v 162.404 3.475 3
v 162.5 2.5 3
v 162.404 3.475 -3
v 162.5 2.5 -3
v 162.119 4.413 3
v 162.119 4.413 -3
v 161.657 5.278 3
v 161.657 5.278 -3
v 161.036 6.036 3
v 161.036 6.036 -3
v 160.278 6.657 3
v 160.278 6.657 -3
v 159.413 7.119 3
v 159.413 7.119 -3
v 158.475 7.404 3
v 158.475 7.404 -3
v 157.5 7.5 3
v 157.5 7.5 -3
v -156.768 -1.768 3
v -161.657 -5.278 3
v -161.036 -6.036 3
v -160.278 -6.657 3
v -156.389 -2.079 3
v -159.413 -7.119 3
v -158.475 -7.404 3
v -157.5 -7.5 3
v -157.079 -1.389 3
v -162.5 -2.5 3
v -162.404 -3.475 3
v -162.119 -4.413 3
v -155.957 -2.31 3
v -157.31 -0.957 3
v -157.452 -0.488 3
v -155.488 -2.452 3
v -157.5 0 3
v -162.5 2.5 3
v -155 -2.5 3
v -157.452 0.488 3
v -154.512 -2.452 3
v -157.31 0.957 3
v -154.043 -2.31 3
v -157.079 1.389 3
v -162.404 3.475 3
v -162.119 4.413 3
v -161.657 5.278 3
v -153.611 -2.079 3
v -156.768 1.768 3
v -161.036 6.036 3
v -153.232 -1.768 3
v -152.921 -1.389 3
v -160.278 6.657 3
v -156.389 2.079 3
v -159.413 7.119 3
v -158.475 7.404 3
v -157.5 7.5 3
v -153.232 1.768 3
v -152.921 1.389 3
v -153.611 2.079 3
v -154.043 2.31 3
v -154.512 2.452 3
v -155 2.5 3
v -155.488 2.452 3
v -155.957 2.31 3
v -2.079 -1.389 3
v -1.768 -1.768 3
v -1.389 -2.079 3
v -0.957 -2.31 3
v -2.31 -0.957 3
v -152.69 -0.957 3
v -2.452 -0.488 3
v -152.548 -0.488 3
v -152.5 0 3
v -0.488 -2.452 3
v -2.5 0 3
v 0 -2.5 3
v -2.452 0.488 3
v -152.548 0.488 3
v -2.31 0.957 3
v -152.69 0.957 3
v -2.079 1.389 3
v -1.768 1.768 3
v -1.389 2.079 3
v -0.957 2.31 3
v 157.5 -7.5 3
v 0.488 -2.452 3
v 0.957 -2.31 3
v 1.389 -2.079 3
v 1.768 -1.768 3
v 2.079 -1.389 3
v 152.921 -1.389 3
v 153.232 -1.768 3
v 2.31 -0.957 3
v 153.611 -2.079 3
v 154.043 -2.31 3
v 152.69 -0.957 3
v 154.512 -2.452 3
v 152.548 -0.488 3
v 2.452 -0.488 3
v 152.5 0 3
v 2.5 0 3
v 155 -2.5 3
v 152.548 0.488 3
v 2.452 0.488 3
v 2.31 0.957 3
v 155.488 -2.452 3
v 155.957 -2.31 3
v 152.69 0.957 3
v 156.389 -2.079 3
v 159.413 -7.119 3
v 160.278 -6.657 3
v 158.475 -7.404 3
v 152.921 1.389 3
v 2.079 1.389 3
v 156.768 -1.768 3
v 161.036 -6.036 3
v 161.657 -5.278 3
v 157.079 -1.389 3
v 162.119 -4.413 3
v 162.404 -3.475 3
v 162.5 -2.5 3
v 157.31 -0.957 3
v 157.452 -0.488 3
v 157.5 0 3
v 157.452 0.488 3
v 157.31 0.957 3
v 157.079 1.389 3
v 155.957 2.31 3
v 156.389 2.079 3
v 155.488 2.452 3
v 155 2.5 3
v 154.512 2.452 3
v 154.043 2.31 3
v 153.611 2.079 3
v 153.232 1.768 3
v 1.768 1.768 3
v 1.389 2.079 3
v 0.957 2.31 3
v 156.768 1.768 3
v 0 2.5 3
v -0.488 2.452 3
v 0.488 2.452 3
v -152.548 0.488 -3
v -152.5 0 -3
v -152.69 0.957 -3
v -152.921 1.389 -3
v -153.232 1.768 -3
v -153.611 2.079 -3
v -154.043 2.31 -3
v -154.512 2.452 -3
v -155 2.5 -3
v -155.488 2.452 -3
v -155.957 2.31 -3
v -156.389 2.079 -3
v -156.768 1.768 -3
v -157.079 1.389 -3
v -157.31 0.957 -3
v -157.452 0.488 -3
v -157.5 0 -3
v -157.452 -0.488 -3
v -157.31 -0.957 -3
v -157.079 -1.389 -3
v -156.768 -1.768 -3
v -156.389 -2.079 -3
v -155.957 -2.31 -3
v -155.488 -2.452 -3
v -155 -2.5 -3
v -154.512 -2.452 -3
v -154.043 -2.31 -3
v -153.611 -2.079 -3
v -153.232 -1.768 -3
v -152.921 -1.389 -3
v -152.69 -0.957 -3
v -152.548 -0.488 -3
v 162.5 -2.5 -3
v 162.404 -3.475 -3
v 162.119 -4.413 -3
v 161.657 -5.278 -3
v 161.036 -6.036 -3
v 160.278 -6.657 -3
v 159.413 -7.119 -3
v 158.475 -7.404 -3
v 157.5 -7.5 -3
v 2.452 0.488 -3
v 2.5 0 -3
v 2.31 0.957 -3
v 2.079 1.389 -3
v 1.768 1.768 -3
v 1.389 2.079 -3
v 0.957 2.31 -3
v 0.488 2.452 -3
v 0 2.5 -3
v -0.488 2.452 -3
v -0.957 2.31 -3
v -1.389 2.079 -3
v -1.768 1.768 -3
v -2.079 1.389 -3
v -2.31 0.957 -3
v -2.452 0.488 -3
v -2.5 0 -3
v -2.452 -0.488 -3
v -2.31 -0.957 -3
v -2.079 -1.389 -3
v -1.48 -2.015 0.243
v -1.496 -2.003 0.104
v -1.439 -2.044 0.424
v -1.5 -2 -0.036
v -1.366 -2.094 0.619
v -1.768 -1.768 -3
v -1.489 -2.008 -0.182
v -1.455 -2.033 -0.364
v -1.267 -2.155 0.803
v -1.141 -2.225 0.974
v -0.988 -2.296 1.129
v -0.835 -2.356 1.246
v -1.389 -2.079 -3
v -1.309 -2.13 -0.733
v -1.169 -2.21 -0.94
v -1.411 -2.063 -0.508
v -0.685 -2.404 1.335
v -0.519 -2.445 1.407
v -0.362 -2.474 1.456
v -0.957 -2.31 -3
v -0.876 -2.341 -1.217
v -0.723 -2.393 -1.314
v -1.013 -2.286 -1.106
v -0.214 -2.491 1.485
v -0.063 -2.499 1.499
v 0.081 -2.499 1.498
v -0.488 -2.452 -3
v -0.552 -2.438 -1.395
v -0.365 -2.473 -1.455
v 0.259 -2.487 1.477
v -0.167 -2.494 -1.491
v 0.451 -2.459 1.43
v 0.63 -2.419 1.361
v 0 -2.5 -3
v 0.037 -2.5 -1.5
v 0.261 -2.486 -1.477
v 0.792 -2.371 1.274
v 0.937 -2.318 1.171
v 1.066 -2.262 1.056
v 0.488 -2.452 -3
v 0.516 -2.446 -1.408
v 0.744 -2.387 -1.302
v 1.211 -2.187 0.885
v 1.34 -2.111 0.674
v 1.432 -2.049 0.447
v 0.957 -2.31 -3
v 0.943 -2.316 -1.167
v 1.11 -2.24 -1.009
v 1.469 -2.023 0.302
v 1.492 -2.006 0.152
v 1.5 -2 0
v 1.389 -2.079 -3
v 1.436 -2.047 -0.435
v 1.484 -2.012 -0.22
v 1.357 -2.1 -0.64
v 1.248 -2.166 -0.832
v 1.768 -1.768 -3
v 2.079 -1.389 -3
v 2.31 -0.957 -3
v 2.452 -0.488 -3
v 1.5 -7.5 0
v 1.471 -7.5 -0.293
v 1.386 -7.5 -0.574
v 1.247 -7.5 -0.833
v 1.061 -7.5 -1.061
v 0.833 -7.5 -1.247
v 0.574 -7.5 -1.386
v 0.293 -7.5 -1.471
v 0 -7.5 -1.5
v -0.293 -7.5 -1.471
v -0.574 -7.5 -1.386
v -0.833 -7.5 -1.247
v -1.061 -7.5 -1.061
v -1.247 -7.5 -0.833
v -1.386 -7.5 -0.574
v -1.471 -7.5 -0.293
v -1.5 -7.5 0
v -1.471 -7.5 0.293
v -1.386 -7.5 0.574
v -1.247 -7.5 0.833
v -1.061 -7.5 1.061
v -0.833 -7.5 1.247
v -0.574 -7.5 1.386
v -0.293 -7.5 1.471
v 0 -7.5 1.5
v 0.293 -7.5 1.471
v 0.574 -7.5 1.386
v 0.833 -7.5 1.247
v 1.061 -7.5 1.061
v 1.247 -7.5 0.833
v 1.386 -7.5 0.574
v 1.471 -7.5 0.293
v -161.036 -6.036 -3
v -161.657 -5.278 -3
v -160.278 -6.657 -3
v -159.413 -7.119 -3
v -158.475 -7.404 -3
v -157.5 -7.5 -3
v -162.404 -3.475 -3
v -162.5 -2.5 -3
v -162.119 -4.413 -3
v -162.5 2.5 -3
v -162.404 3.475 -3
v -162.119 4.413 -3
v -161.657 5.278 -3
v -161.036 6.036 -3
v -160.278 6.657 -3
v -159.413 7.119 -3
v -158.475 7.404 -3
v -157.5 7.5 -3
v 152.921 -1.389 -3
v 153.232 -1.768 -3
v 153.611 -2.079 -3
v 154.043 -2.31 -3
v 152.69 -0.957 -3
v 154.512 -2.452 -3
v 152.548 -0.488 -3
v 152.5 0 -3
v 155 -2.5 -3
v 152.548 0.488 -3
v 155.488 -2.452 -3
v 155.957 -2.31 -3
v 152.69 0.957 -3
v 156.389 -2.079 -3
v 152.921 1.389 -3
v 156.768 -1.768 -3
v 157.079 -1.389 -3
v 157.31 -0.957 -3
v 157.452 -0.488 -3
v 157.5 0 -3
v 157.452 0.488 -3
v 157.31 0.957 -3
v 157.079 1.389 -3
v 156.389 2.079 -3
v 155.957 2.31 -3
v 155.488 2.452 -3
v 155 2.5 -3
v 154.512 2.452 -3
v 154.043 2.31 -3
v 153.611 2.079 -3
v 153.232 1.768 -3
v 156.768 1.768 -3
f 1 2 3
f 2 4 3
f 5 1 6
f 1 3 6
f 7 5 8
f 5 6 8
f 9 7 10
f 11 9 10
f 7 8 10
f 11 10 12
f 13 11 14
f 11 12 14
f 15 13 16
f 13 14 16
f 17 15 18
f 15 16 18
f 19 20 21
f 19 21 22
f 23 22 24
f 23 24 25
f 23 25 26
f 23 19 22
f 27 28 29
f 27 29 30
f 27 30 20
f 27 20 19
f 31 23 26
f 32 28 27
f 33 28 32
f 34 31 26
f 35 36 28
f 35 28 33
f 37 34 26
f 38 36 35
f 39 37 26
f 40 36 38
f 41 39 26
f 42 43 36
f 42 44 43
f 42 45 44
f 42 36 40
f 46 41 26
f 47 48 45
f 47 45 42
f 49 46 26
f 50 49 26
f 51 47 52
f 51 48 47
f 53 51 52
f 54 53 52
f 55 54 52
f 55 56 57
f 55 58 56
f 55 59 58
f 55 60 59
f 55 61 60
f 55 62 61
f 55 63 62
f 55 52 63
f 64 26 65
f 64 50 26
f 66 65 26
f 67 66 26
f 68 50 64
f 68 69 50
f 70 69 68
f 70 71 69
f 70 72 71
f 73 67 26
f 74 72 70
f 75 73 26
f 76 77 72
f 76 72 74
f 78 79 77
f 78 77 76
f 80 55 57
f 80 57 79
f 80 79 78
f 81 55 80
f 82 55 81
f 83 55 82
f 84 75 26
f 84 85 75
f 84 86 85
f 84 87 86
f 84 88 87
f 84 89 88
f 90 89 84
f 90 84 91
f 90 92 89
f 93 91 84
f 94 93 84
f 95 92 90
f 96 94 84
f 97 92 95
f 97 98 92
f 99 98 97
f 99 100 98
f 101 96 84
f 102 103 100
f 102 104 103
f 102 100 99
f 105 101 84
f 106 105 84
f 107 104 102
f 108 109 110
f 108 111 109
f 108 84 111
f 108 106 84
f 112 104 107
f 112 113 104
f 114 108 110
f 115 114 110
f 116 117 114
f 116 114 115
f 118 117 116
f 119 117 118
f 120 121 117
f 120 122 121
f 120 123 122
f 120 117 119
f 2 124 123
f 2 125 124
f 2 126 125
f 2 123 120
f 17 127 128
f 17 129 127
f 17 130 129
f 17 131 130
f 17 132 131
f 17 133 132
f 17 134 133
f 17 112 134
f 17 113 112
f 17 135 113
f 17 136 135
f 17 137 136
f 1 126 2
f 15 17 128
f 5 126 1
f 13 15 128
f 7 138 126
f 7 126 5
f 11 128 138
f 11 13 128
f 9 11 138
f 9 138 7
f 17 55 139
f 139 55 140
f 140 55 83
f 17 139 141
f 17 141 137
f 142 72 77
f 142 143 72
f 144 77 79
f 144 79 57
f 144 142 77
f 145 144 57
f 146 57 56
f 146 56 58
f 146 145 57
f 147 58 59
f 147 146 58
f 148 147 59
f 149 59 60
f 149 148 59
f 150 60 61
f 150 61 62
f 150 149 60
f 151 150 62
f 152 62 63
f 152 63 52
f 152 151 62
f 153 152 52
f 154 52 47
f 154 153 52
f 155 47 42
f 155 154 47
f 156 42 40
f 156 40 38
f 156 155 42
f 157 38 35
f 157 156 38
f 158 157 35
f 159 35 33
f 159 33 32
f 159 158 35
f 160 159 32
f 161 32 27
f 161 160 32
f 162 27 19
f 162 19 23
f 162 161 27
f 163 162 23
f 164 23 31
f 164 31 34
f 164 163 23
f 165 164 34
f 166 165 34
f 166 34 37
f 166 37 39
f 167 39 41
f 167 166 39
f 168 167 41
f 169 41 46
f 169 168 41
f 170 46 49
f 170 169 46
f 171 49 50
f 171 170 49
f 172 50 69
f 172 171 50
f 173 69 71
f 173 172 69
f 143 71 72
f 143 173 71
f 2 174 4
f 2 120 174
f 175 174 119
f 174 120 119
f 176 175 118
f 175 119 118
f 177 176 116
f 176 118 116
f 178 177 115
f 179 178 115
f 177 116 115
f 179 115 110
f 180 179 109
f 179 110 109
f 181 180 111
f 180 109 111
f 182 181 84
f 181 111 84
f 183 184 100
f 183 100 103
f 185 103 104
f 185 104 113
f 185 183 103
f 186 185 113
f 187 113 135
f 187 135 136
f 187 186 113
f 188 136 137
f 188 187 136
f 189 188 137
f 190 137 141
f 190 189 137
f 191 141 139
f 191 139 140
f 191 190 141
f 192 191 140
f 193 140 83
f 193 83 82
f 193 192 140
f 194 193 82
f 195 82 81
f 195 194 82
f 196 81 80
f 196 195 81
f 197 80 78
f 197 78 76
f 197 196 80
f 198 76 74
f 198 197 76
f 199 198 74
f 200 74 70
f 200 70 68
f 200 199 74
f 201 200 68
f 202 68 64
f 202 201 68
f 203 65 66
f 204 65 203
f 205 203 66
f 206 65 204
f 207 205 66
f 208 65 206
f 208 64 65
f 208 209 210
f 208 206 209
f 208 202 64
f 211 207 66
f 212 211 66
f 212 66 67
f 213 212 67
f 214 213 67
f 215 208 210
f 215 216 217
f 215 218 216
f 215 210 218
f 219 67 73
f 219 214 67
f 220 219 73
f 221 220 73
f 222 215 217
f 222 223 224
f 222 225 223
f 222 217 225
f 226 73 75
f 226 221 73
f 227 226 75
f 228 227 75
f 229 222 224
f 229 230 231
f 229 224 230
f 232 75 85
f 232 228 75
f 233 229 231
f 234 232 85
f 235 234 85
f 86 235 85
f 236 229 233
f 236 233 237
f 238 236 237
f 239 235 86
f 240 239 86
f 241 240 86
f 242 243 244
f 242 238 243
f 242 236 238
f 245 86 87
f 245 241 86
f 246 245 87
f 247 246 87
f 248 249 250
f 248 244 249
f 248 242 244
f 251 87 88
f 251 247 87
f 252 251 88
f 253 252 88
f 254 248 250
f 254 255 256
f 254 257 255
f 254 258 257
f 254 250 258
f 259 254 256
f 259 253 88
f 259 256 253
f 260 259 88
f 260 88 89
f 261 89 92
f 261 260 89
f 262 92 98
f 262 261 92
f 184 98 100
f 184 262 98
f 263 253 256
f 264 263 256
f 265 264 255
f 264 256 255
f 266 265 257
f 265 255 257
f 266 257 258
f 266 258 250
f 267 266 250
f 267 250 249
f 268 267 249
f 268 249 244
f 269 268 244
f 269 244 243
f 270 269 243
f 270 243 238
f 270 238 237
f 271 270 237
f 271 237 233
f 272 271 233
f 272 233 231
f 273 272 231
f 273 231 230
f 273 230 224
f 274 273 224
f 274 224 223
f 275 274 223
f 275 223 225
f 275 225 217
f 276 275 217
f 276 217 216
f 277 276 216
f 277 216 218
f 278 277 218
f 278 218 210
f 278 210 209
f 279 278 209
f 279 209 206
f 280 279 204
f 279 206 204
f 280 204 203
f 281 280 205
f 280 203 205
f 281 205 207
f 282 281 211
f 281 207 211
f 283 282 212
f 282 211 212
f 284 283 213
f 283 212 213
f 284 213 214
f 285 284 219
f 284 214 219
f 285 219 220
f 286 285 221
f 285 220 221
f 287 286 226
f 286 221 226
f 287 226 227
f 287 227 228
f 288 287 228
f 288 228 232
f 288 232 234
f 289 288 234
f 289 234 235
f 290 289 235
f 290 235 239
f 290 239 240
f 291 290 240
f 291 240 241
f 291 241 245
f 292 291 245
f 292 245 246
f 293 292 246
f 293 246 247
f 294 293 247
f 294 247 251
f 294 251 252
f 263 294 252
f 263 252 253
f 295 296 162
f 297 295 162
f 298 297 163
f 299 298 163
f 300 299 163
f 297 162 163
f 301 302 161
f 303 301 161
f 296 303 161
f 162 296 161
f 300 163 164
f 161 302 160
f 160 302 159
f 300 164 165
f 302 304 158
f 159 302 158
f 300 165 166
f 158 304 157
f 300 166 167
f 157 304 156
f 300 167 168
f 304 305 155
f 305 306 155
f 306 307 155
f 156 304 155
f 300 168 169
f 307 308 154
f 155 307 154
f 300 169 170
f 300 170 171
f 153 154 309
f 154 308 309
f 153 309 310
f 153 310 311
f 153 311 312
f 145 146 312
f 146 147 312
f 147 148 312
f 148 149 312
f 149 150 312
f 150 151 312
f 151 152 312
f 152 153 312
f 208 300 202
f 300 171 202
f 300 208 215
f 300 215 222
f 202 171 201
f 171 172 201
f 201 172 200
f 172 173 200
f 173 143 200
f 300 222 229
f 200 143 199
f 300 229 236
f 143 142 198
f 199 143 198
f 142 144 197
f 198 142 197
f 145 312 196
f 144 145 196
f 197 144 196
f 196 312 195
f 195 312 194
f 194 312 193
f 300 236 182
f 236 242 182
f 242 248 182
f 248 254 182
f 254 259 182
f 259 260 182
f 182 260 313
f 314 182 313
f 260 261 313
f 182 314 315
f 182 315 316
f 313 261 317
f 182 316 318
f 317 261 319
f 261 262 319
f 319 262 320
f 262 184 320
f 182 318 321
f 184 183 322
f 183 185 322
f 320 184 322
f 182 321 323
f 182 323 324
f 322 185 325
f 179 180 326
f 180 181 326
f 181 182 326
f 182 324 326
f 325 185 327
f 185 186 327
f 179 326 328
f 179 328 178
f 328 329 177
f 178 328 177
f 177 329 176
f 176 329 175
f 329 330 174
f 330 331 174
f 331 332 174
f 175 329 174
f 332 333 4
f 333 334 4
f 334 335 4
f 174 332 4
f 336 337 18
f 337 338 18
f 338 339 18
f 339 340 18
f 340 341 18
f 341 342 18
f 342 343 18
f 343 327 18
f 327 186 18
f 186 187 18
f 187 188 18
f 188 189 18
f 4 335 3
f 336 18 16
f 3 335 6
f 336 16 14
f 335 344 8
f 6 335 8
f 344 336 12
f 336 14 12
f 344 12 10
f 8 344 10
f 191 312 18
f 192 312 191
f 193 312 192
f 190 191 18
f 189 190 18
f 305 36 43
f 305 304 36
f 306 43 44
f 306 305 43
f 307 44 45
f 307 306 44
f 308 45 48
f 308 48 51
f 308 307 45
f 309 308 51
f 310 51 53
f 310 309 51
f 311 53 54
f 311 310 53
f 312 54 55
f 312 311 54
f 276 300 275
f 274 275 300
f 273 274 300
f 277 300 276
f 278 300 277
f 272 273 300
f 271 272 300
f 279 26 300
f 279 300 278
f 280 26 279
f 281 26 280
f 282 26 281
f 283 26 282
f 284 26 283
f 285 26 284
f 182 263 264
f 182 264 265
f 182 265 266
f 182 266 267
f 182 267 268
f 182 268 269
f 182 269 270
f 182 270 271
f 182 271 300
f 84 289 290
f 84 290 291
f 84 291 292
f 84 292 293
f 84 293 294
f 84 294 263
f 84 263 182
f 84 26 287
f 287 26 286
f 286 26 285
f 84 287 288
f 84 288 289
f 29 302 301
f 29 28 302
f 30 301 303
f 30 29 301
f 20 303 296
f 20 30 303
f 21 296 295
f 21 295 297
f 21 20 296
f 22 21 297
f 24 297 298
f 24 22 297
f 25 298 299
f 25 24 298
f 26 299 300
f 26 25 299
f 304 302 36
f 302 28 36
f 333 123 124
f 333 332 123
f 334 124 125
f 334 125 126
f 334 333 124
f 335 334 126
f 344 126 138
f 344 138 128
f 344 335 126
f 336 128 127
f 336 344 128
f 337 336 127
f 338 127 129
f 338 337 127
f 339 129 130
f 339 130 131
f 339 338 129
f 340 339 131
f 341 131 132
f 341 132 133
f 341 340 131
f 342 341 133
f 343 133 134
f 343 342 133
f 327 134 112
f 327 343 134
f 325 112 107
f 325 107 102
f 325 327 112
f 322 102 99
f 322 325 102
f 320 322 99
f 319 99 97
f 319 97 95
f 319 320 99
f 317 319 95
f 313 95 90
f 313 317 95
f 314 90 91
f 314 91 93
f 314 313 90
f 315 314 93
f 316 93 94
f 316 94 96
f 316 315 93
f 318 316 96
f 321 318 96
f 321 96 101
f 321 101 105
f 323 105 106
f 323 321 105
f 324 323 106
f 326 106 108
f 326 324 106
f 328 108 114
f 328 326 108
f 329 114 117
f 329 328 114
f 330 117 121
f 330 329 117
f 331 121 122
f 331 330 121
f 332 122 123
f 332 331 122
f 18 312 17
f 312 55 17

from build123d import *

# Parameters (mm, degrees)
SZKIC1_W                       = 325
SZKIC1_H                       = 15
SZKIC1_R                       = 2.5
DODANIE_WYCI_GNI_CIE1_DEPTH    = 3
ZAOKR_GLENIE1_R                = 5
OTWORY_USTALAJ_CE_3_0MM1_D     = 3
OTWORY_USTALAJ_CE_3_0MM1_DEPTH = 7.499
OTWORY_USTALAJ_CE_3_0MM1_TIP   = 0.901290929


with BuildPart() as part:
    # Szkic1 → Dodanie-wyciągnięcie1 (new, symmetric)
    with BuildSketch(Plane.XY):
        Rectangle(SZKIC1_W, SZKIC1_H)
        with Locations((155, 0)):
            Circle(SZKIC1_R, mode=Mode.SUBTRACT)
        with Locations((-155, 0)):
            Circle(SZKIC1_R, mode=Mode.SUBTRACT)
        Circle(SZKIC1_R, mode=Mode.SUBTRACT)
    extrude(amount=DODANIE_WYCI_GNI_CIE1_DEPTH, both=True)

    # Zaokrąglenie1
    zaokr_glenie1_edges = [part.edges().sort_by_distance(p)[0] for p in [
        (162.5, 7.5, 0),
        (162.5, -7.5, 0),
        (-162.5, -7.5, 0),
        (-162.5, 7.5, 0),
    ]]
    fillet(zaokr_glenie1_edges, radius=ZAOKR_GLENIE1_R)

    # Otwory ustalające Ø3.0mm1
    with Locations(Plane(origin=(0, -7.5, 0), x_dir=(-1, 0, 0), z_dir=(0, -1, 0))):
        with Locations((0, 0)):
            Hole(OTWORY_USTALAJ_CE_3_0MM1_D / 2, depth=OTWORY_USTALAJ_CE_3_0MM1_DEPTH)
            with Locations((0, 0, -(OTWORY_USTALAJ_CE_3_0MM1_DEPTH + OTWORY_USTALAJ_CE_3_0MM1_TIP / 2))):  # 118° drill point
                Cone(0, OTWORY_USTALAJ_CE_3_0MM1_D / 2, OTWORY_USTALAJ_CE_3_0MM1_TIP, mode=Mode.SUBTRACT)


solid = part.part
